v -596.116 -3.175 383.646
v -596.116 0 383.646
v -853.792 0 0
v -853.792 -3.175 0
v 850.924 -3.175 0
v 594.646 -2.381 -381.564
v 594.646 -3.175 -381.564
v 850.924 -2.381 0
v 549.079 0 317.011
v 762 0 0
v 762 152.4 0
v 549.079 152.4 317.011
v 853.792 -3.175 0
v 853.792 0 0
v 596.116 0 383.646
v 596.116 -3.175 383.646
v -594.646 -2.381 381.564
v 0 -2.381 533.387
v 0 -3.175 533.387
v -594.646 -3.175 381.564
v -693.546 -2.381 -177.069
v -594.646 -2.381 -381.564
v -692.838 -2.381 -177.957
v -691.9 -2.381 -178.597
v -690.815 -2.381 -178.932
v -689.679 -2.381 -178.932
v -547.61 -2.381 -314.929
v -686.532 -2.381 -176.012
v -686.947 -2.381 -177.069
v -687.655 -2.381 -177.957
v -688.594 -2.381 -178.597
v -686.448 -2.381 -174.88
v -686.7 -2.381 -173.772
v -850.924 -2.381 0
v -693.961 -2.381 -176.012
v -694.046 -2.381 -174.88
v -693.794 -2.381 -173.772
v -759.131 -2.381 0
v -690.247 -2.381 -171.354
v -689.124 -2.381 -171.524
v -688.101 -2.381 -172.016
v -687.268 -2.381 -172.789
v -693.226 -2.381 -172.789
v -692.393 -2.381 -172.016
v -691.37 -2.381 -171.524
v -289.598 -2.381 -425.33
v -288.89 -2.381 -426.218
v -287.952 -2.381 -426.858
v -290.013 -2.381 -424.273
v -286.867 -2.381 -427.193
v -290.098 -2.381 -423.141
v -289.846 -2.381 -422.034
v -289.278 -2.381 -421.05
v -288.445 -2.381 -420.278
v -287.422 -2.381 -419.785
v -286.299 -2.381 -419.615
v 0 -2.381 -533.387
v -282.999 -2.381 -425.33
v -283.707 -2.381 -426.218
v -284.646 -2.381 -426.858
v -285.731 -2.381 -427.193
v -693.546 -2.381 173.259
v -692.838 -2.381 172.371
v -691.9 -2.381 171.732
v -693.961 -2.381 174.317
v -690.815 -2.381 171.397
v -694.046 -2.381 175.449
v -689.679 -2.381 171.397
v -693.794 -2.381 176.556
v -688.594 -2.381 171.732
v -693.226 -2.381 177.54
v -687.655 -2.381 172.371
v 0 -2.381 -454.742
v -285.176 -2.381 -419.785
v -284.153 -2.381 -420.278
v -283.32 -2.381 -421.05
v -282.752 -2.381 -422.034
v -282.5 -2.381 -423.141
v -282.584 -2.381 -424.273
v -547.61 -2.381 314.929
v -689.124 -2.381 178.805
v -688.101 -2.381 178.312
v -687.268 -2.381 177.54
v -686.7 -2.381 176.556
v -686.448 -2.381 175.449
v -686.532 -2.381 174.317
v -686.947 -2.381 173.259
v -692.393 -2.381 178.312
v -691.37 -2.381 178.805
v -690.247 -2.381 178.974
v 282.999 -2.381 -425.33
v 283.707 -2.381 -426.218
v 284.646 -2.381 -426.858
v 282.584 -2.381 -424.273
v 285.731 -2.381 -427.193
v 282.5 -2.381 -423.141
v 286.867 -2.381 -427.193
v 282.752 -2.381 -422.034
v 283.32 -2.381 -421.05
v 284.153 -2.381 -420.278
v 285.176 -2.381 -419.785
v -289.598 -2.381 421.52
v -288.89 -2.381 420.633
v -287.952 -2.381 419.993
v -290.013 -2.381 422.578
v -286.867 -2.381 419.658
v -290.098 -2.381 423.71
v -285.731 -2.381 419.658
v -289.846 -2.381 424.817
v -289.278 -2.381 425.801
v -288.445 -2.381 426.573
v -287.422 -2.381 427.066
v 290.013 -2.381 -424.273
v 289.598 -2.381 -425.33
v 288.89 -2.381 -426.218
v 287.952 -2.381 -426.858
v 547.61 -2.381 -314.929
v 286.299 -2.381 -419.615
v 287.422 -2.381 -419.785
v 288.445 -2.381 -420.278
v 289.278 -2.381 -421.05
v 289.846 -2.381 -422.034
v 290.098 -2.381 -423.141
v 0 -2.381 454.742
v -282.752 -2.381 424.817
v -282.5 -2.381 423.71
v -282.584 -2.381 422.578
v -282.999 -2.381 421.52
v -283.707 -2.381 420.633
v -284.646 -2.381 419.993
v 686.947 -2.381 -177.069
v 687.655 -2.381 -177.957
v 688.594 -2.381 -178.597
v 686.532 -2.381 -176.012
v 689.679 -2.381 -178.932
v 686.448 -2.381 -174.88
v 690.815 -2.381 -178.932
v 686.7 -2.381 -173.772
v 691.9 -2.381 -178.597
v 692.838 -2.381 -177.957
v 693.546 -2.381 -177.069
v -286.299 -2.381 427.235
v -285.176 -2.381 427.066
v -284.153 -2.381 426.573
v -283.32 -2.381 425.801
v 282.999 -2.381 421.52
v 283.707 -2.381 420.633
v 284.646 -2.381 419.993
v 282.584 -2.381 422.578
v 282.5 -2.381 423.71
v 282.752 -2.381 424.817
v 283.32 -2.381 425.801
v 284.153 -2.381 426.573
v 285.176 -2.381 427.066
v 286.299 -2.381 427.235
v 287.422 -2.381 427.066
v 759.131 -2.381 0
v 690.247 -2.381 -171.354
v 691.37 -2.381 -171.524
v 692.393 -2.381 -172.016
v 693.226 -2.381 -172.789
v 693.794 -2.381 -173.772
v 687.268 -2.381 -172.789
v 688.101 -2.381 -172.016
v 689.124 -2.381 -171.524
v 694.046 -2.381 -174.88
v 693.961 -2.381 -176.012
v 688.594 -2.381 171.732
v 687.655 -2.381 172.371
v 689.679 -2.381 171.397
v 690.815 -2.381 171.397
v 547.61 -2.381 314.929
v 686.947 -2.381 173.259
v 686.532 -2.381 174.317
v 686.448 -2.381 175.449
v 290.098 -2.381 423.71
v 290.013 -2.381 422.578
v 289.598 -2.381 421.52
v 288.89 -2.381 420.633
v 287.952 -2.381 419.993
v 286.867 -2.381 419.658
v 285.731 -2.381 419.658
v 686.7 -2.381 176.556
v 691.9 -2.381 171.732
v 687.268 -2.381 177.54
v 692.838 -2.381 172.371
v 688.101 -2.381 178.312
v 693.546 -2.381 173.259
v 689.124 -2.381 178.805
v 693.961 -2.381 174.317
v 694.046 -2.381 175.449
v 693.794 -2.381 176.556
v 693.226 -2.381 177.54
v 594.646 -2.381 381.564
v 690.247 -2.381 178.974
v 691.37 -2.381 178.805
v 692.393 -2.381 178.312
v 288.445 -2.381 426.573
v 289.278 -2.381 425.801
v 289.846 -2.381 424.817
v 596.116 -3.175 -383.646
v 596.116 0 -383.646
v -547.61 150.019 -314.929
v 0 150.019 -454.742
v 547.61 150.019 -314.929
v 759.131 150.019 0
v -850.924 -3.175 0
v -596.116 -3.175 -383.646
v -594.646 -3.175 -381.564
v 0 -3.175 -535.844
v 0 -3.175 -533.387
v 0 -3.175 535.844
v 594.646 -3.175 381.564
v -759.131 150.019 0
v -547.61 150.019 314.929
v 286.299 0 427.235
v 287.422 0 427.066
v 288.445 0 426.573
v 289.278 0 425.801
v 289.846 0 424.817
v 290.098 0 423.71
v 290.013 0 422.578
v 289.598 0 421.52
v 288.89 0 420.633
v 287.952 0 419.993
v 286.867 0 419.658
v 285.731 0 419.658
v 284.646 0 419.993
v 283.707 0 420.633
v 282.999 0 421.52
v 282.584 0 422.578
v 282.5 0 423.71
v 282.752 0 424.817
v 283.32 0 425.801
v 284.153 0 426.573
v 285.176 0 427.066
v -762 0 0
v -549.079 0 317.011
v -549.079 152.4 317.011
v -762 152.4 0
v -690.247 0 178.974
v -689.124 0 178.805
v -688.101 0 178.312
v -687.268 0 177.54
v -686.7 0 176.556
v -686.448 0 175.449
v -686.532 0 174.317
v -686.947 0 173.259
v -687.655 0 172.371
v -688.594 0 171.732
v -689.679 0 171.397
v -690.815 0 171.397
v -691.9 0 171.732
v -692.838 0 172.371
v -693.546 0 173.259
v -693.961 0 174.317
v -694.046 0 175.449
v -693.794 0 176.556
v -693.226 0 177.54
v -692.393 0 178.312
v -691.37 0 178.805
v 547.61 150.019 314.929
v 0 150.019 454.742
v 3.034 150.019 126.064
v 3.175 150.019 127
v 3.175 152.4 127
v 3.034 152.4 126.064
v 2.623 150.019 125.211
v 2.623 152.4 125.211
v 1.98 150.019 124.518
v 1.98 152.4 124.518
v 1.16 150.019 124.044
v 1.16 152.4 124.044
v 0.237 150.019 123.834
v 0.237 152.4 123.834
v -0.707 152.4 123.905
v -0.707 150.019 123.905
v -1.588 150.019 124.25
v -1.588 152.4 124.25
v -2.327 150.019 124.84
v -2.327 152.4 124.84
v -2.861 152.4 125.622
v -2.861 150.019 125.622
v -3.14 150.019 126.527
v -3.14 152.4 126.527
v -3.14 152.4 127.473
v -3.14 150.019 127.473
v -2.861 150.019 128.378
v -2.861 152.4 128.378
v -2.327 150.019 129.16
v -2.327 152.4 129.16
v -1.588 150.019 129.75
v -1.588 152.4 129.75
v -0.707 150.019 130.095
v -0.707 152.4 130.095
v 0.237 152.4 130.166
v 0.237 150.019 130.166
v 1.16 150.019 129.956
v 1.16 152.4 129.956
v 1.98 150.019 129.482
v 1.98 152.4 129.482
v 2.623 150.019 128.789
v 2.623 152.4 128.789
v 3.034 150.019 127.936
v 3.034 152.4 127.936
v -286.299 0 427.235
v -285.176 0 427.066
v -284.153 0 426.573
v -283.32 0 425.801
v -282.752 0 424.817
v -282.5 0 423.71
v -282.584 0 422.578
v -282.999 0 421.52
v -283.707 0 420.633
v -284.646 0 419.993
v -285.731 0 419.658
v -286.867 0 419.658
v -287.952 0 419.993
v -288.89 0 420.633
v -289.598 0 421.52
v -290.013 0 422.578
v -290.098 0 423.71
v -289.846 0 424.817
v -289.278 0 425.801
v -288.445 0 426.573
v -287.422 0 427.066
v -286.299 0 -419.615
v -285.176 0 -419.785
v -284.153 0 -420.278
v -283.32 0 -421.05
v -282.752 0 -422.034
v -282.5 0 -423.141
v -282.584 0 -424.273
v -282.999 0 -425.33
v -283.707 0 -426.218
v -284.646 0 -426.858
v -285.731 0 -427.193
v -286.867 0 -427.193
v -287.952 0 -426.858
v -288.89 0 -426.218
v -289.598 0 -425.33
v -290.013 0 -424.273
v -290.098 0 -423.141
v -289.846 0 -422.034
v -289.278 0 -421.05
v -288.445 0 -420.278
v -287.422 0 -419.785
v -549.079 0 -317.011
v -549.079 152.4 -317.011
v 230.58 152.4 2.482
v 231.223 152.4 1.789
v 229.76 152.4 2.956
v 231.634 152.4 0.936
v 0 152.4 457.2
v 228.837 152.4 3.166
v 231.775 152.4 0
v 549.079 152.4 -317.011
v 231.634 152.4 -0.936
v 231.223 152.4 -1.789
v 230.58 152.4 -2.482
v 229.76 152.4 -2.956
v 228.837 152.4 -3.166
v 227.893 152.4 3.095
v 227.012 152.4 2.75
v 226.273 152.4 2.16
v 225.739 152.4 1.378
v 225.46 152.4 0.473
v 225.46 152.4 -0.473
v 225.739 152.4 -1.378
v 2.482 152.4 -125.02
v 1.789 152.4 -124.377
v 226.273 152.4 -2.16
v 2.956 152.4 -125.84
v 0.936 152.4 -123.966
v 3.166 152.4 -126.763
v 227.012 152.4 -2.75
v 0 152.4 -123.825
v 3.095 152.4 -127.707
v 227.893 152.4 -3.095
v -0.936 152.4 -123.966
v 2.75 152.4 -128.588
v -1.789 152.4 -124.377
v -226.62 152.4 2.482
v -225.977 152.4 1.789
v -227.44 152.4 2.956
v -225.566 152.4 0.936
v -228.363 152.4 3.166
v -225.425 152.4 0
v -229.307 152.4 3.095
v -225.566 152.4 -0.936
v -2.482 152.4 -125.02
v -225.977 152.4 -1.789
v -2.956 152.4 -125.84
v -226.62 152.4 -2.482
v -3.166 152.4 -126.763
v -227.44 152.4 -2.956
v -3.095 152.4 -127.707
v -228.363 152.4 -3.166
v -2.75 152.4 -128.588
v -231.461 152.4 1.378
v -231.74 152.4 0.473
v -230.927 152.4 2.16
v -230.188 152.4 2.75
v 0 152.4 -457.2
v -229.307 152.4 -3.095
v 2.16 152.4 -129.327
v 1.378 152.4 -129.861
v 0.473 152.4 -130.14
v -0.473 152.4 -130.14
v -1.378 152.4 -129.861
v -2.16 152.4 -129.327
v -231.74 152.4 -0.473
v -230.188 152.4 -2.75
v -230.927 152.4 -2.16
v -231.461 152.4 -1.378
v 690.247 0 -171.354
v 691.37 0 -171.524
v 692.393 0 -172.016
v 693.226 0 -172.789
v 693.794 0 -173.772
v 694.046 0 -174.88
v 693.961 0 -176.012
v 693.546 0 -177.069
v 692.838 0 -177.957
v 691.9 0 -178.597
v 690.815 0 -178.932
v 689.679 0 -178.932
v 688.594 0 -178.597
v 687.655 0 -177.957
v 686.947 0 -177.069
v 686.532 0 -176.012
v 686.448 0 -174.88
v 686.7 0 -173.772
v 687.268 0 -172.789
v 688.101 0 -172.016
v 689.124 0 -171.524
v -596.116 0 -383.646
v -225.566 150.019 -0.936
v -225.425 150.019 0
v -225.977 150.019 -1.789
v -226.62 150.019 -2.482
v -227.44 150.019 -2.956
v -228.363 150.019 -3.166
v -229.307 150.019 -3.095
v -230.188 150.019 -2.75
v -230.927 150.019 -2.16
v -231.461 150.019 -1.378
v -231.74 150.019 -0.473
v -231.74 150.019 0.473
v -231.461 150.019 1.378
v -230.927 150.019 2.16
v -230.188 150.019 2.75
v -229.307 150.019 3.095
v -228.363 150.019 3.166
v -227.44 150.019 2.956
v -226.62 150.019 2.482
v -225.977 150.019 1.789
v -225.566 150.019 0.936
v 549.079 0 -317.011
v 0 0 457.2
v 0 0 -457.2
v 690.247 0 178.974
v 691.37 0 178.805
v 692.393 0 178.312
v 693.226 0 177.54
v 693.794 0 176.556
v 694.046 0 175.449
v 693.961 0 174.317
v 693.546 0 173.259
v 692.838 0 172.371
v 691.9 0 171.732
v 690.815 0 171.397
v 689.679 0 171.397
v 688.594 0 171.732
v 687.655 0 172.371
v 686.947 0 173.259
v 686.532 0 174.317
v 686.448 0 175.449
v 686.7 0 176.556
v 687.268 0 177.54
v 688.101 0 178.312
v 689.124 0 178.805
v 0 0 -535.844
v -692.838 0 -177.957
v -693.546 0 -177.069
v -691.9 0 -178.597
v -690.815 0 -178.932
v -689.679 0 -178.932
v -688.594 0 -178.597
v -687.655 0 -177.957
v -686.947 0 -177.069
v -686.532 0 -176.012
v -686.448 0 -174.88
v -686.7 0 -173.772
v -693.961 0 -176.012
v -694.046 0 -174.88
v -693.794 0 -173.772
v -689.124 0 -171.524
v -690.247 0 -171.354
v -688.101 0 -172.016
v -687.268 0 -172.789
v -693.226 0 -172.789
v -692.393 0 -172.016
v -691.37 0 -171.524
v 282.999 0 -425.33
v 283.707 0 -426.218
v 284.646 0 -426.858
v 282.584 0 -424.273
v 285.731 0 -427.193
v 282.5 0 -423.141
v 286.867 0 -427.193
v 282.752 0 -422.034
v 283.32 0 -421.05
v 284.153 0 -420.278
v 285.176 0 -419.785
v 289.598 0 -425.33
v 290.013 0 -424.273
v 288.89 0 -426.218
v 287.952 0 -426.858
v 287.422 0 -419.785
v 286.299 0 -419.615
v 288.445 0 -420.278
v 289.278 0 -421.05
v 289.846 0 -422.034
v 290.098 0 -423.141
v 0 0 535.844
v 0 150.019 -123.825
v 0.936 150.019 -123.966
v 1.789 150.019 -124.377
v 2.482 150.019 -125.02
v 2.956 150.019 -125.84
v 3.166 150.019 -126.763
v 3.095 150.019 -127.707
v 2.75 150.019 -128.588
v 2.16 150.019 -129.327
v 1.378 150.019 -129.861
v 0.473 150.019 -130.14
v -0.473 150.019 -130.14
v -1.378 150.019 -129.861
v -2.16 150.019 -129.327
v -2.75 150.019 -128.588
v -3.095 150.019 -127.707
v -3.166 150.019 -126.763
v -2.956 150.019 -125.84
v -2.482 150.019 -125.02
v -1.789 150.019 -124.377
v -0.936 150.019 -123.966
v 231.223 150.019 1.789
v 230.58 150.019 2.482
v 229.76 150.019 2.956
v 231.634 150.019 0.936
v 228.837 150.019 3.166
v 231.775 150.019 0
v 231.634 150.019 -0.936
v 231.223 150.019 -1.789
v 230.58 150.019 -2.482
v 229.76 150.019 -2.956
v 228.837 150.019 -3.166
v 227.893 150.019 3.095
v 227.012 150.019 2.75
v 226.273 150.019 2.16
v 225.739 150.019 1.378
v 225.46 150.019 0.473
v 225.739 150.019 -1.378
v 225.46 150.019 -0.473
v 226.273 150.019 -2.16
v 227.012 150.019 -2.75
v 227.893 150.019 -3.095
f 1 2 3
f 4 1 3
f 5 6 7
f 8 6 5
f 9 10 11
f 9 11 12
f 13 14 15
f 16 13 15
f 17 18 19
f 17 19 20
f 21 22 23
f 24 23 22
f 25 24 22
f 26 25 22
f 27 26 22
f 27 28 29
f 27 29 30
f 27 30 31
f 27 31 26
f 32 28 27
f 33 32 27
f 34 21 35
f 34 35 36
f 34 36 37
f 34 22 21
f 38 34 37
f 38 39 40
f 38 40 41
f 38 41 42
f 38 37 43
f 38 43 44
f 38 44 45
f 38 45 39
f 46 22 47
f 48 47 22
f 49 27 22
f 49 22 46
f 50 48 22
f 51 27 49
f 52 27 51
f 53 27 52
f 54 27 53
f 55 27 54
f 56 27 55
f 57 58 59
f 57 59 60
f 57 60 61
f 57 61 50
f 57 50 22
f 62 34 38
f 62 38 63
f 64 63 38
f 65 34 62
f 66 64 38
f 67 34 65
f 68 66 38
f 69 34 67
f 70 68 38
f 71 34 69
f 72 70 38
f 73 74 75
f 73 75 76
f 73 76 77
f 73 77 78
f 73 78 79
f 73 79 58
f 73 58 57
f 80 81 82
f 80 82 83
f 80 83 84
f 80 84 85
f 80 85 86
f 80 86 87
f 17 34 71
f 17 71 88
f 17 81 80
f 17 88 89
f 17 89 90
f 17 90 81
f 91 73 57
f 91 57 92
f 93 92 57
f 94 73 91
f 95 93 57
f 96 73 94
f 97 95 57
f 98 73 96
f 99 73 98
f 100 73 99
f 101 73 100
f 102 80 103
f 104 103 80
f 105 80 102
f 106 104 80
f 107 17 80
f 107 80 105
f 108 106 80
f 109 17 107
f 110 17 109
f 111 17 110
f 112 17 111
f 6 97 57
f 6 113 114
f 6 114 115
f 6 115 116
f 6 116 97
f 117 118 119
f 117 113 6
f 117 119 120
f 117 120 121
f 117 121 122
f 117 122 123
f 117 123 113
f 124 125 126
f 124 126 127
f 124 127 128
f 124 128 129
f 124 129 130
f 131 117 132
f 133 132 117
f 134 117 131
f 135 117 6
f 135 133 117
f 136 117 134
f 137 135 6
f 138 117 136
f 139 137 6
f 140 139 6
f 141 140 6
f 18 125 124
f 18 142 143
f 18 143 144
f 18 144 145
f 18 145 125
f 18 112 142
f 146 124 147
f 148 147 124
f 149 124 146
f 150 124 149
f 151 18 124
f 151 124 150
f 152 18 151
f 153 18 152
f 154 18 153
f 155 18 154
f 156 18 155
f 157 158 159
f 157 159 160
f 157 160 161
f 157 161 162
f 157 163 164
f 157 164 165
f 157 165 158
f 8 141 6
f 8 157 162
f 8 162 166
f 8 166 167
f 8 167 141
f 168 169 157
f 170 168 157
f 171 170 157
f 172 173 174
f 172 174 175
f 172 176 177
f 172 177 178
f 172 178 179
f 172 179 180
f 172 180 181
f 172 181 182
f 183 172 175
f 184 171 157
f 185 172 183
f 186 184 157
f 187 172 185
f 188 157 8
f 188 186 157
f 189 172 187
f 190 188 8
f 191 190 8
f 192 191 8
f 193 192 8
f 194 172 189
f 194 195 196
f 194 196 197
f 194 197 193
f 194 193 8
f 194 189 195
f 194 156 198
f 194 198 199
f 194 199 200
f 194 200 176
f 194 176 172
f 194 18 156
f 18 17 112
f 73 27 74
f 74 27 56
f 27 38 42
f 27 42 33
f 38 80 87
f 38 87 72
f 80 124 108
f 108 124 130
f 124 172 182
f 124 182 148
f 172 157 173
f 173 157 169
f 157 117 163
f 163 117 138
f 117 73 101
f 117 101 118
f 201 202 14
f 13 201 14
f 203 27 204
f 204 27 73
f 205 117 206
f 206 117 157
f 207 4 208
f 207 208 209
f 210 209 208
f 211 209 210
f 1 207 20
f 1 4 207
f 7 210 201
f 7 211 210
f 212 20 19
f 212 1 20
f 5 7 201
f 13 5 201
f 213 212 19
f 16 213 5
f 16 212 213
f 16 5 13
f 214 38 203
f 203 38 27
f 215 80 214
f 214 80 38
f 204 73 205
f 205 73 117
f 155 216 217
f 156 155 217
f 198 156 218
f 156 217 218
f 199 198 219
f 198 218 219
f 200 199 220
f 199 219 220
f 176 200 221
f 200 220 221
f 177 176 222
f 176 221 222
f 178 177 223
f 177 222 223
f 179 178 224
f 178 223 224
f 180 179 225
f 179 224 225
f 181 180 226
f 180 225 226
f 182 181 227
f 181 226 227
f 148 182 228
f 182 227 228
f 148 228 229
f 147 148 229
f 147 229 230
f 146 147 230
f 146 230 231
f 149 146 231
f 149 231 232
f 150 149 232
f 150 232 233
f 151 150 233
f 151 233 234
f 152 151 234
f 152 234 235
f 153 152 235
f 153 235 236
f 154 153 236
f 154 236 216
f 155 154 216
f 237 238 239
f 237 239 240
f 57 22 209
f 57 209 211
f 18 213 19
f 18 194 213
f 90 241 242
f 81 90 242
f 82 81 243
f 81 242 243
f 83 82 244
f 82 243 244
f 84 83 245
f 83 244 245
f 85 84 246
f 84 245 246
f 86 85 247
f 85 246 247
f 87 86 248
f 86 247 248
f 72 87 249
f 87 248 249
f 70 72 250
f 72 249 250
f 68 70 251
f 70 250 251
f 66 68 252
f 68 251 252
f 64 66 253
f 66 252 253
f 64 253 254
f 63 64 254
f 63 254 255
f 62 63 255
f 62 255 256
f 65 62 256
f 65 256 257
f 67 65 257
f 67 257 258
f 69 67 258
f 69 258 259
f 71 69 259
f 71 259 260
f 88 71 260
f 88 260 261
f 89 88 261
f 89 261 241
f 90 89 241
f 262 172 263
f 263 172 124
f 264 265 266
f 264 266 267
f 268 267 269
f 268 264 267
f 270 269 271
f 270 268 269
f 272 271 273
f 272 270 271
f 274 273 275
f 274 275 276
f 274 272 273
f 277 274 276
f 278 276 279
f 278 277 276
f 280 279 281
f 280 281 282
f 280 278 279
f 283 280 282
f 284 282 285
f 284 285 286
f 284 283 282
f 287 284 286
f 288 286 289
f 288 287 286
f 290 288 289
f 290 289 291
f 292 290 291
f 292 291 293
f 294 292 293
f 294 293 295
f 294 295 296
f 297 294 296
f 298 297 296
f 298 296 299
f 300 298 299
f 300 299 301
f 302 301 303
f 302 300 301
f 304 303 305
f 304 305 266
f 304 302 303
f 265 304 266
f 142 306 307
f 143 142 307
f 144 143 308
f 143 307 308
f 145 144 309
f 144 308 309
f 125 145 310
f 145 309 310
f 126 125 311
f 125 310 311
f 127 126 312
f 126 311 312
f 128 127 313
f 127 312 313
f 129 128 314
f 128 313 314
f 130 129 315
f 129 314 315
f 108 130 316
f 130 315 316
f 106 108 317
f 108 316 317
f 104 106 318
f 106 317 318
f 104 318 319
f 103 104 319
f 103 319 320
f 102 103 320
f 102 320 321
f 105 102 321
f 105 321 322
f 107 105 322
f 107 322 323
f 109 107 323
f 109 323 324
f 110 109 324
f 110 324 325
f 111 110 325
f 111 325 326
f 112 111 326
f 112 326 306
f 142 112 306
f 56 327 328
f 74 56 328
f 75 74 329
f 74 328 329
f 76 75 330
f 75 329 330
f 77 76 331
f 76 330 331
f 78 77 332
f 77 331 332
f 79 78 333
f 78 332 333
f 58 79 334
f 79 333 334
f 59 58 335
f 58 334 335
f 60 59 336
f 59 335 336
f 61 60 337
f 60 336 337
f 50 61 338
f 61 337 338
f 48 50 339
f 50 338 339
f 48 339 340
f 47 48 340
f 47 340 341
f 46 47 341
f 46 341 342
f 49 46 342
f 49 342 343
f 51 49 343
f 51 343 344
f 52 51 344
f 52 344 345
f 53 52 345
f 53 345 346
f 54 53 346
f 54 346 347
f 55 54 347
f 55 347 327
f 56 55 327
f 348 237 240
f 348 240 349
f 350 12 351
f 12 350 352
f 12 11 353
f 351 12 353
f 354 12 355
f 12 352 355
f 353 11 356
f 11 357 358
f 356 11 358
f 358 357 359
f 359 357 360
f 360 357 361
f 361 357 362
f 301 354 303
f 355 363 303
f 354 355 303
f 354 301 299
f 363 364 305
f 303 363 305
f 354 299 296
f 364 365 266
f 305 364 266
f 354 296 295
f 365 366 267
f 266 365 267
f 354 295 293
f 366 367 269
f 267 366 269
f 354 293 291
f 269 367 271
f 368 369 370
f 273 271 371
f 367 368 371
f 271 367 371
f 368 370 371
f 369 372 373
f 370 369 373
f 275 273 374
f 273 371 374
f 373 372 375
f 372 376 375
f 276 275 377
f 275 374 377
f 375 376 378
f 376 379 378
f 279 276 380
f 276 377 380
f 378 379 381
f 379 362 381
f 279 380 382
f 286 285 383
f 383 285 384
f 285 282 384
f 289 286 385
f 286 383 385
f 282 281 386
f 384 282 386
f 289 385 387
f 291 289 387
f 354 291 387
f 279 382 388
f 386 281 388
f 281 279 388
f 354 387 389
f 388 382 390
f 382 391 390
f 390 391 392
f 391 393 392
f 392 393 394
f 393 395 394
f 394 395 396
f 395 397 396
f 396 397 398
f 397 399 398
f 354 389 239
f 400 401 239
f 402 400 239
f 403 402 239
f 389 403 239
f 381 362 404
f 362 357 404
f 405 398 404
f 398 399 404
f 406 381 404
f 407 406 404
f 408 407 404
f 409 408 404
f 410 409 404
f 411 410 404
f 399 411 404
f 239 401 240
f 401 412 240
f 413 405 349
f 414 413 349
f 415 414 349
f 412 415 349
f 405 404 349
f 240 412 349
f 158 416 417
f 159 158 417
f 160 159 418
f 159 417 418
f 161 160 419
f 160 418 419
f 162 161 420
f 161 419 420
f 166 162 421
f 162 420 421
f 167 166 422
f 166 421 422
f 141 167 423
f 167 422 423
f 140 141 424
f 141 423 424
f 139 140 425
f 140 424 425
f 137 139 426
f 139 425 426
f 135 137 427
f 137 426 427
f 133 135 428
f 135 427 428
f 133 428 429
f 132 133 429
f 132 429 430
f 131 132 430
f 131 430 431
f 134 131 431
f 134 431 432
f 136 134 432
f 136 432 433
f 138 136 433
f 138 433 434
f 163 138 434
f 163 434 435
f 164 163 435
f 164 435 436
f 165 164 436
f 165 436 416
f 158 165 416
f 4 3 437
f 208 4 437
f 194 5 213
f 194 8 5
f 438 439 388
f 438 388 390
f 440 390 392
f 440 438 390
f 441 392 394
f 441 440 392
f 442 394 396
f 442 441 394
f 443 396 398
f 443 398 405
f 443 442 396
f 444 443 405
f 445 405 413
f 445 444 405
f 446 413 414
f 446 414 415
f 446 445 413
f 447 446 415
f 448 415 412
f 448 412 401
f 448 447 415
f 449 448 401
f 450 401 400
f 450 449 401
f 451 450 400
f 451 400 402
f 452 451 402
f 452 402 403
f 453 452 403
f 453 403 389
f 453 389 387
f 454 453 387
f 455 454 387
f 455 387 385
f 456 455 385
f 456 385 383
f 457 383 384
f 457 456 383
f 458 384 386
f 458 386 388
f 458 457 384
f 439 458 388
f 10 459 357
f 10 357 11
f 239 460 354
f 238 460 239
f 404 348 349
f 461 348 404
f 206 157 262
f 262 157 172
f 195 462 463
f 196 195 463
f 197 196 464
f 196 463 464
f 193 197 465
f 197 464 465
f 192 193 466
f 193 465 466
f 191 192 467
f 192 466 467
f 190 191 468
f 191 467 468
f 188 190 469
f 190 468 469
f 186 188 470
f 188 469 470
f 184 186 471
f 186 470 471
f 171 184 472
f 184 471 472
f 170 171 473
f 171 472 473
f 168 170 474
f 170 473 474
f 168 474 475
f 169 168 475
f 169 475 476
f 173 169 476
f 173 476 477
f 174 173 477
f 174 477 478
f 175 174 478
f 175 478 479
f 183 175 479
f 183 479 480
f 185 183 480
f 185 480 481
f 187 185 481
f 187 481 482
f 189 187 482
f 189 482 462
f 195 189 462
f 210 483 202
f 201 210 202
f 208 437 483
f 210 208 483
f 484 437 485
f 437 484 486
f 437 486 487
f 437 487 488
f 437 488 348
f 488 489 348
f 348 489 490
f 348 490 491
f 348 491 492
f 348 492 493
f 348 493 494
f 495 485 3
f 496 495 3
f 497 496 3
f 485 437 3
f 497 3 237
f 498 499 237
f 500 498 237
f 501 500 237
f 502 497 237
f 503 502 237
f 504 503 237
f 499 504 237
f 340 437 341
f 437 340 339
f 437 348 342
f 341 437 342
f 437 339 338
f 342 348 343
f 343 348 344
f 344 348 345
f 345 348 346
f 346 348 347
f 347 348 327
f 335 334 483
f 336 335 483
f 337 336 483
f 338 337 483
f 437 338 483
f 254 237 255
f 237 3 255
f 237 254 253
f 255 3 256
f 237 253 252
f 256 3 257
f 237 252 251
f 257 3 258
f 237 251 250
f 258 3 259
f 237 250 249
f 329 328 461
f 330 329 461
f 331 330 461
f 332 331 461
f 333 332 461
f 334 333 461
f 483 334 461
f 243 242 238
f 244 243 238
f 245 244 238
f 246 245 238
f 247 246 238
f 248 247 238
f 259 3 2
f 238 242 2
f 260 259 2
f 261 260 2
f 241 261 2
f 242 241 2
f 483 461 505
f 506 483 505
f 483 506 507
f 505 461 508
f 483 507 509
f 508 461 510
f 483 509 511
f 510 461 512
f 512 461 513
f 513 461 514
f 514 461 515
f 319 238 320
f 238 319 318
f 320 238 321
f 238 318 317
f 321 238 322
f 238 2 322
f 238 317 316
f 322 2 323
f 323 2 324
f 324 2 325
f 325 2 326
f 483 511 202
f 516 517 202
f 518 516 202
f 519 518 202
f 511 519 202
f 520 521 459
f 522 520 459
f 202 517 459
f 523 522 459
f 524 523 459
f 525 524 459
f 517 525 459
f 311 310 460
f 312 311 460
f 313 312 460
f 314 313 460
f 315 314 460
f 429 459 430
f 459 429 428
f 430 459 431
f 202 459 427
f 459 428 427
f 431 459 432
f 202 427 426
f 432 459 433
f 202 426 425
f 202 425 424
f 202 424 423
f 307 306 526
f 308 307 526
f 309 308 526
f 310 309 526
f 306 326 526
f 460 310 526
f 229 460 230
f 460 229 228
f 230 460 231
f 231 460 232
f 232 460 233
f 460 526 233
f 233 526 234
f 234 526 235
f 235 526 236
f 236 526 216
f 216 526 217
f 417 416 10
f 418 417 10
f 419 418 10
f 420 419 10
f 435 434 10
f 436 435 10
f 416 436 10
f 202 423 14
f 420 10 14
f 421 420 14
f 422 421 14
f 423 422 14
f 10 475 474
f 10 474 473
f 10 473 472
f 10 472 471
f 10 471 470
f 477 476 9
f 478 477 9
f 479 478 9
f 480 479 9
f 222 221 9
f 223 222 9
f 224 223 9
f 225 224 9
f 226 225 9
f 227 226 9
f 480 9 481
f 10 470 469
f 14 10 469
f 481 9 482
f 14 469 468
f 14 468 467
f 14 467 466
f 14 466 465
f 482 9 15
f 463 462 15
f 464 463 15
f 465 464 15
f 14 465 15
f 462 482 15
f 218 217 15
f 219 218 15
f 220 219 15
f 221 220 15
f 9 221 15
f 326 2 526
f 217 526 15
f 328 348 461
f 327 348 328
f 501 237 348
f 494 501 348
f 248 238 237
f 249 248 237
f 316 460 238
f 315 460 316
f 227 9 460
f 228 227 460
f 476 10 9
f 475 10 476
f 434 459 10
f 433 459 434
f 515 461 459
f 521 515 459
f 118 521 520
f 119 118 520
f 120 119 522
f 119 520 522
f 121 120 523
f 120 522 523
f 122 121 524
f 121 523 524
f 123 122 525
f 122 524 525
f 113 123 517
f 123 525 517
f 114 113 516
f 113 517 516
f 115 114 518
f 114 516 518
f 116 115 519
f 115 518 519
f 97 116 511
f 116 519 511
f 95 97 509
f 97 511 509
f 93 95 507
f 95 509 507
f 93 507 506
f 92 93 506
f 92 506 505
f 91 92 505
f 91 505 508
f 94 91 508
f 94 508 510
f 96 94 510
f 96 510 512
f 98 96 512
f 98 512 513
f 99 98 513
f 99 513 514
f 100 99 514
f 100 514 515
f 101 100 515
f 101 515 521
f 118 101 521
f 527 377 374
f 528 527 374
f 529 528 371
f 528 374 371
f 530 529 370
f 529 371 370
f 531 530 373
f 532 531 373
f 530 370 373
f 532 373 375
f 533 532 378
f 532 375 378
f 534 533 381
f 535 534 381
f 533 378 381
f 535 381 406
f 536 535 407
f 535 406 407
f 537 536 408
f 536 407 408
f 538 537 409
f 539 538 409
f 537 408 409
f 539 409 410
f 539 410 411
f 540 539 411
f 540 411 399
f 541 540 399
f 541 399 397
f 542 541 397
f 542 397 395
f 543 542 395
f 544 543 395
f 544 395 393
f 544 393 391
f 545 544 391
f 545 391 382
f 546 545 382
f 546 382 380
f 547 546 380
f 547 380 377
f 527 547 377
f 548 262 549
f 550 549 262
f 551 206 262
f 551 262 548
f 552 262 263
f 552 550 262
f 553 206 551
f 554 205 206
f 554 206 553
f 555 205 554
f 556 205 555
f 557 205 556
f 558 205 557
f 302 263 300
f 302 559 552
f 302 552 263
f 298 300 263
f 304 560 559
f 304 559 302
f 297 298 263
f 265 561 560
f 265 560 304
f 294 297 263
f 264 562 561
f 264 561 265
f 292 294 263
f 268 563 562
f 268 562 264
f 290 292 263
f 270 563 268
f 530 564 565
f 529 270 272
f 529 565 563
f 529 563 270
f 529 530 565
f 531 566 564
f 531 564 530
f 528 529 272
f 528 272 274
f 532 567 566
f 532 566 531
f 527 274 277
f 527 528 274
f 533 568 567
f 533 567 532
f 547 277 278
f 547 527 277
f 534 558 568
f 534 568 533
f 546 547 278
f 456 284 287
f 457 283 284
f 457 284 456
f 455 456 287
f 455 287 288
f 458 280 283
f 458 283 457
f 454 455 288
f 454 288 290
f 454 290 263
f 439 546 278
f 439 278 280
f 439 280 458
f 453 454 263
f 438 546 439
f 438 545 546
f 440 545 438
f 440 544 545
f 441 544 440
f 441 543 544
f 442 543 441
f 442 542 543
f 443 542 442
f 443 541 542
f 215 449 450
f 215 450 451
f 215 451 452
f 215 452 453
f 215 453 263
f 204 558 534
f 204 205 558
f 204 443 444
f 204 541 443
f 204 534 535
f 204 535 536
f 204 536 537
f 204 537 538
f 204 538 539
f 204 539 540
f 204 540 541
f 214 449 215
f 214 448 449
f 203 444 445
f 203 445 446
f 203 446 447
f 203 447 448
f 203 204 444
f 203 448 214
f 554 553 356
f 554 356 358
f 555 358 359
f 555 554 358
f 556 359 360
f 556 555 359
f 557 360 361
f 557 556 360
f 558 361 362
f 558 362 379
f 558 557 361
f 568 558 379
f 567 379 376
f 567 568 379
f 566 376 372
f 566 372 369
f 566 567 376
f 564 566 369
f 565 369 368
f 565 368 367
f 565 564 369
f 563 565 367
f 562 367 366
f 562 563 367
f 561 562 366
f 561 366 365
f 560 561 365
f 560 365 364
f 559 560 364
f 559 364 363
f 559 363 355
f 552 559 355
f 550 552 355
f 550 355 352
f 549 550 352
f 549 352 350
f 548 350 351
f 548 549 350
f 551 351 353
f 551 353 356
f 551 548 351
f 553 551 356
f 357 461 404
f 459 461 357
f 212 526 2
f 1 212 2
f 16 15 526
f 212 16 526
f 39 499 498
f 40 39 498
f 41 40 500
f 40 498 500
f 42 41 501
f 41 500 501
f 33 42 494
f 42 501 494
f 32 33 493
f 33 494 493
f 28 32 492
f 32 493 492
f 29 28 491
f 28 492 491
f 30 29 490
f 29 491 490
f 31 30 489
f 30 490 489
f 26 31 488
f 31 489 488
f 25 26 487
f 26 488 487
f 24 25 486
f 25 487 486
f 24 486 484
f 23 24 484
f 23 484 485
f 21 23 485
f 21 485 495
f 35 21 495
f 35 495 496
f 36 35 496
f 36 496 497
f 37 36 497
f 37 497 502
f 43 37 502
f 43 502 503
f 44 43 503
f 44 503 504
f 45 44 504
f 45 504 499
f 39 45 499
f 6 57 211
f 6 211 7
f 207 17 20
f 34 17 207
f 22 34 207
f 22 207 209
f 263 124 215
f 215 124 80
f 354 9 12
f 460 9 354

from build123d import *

# Parameters (mm, degrees)
BOSS_EXTRUDE1_DEPTH   = 152.4
BOSS_EXTRUDE2_DEPTH   = 3.175
SHELL1_T              = -2.38125
SKETCH3_R             = 3.175
CUT_EXTRUDE1_DEPTH    = 1020.94798284
CRVPATTERN1_START     = 150.01875
CRVPATTERN1_OUTLINE_R = 3.175
CRVPATTERN1_DEPTH     = 2.38125
CUT_EXTRUDE2_REACH    = 1021.469
SKETCH5_R             = 3.81


# Read off the part's stored shape, not the designer's step: CrvPattern1
with BuildPart() as part:
    # Sketch1 → Boss-Extrude1 (new body)
    with BuildSketch(Plane(origin=(0, 0, 0), x_dir=(1, 0, 0), z_dir=(0, 1, 0))):
        Polygon((-549.079439398, 317.011162143), (0, 457.2), (549.079439398, 317.011162143), (762, 0), (549.079439398, -317.011162143), (0, -457.2), (-549.079439398, -317.011162143), (-762, 0), align=None)
    extrude(amount=BOSS_EXTRUDE1_DEPTH)

    # Sketch2 → Boss-Extrude2 (add)
    with BuildSketch(Plane.XZ):
        Polygon((0, 535.844392641), (-596.116107134, 383.646334781), (-853.792184287, 0), (-596.116107134, -383.646334781), (0, -535.844392641), (596.116107134, -383.646334781), (853.792184287, 0), (596.116107134, 383.646334781), align=None)
    extrude(amount=BOSS_EXTRUDE2_DEPTH)

    # Shell1
    shell1_openings = [part.faces().sort_by_distance(p)[0] for p in [
        (0, -3.175, 0),
    ]]
    offset(amount=SHELL1_T, openings=shell1_openings, kind=Kind.INTERSECTION)

    # Sketch3 → Cut-Extrude1 (cut, through all)
    with BuildSketch(Plane(origin=(0, 152.4, 0), x_dir=(1, 0, 0), z_dir=(0, 1, 0))):
        with Locations(Location((0, 127, 0), (0, 0, 270))):
            Circle(SKETCH3_R)
    extrude(amount=-CUT_EXTRUDE1_DEPTH, mode=Mode.SUBTRACT)

    # CrvPattern1 outline → CrvPattern1 (cut)
    with BuildSketch(Plane(origin=(0, 0, 0), x_dir=(1, 0, 0), z_dir=(0, 1, 0)).offset(CRVPATTERN1_START)):
        with Locations((-228.6, 0)):
            Circle(CRVPATTERN1_OUTLINE_R)
        with Locations((0, -127)):
            Circle(CRVPATTERN1_OUTLINE_R)
        with Locations((228.6, 0)):
            Circle(CRVPATTERN1_OUTLINE_R)
    extrude(amount=CRVPATTERN1_DEPTH, mode=Mode.SUBTRACT)

    # Sketch5 → Cut-Extrude2 (cut, up to next)
    with BuildSketch(Plane(origin=(0, 0, 0), x_dir=(1, 0, 0), z_dir=(0, 1, 0)), mode=Mode.PRIVATE) as cut_extrude2_sk1:
        with Locations(Location((-286.298886633, 423.425472391, 0), (0, 0, 270))):
            Circle(SKETCH5_R)
    cut_extrude2_tool1 = extrude(cut_extrude2_sk1.sketch, amount=-CUT_EXTRUDE2_REACH, mode=Mode.PRIVATE) & part.part
    # Sketch5 → Cut-Extrude2 (cut, up to next)
    with BuildSketch(Plane(origin=(0, 0, 0), x_dir=(1, 0, 0), z_dir=(0, 1, 0)), mode=Mode.PRIVATE) as cut_extrude2_sk2:
        with Locations(Location((-690.246932705, 175.164374231, 0), (0, 0, 270))):
            Circle(SKETCH5_R)
    cut_extrude2_tool2 = extrude(cut_extrude2_sk2.sketch, amount=-CUT_EXTRUDE2_REACH, mode=Mode.PRIVATE) & part.part
    # Sketch5 → Cut-Extrude2 (cut, up to next)
    with BuildSketch(Plane(origin=(0, 0, 0), x_dir=(1, 0, 0), z_dir=(0, 1, 0)), mode=Mode.PRIVATE) as cut_extrude2_sk3:
        with Locations(Location((-690.246932705, -175.164374231, 0), (0, 0, 270))):
            Circle(SKETCH5_R)
    cut_extrude2_tool3 = extrude(cut_extrude2_sk3.sketch, amount=-CUT_EXTRUDE2_REACH, mode=Mode.PRIVATE) & part.part
    # Sketch5 → Cut-Extrude2 (cut, up to next)
    with BuildSketch(Plane(origin=(0, 0, 0), x_dir=(1, 0, 0), z_dir=(0, 1, 0)), mode=Mode.PRIVATE) as cut_extrude2_sk4:
        with Locations(Location((-286.298886633, -423.425472391, 0), (0, 0, 270))):
            Circle(SKETCH5_R)
    cut_extrude2_tool4 = extrude(cut_extrude2_sk4.sketch, amount=-CUT_EXTRUDE2_REACH, mode=Mode.PRIVATE) & part.part
    # Sketch5 → Cut-Extrude2 (cut, up to next)
    with BuildSketch(Plane(origin=(0, 0, 0), x_dir=(1, 0, 0), z_dir=(0, 1, 0)), mode=Mode.PRIVATE) as cut_extrude2_sk5:
        with Locations(Location((286.298886633, -423.425472391, 0), (0, 0, 270))):
            Circle(SKETCH5_R)
    cut_extrude2_tool5 = extrude(cut_extrude2_sk5.sketch, amount=-CUT_EXTRUDE2_REACH, mode=Mode.PRIVATE) & part.part
    # Sketch5 → Cut-Extrude2 (cut, up to next)
    with BuildSketch(Plane(origin=(0, 0, 0), x_dir=(1, 0, 0), z_dir=(0, 1, 0)), mode=Mode.PRIVATE) as cut_extrude2_sk6:
        with Locations(Location((690.246932705, -175.164374231, 0), (0, 0, 270))):
            Circle(SKETCH5_R)
    cut_extrude2_tool6 = extrude(cut_extrude2_sk6.sketch, amount=-CUT_EXTRUDE2_REACH, mode=Mode.PRIVATE) & part.part
    # Sketch5 → Cut-Extrude2 (cut, up to next)
    with BuildSketch(Plane(origin=(0, 0, 0), x_dir=(1, 0, 0), z_dir=(0, 1, 0)), mode=Mode.PRIVATE) as cut_extrude2_sk7:
        with Locations(Location((690.246932705, 175.164374231, 0), (0, 0, 270))):
            Circle(SKETCH5_R)
    cut_extrude2_tool7 = extrude(cut_extrude2_sk7.sketch, amount=-CUT_EXTRUDE2_REACH, mode=Mode.PRIVATE) & part.part
    # Sketch5 → Cut-Extrude2 (cut, up to next)
    with BuildSketch(Plane(origin=(0, 0, 0), x_dir=(1, 0, 0), z_dir=(0, 1, 0)), mode=Mode.PRIVATE) as cut_extrude2_sk8:
        with Locations(Location((286.298886633, 423.425472391, 0), (0, 0, 270))):
            Circle(SKETCH5_R)
    cut_extrude2_tool8 = extrude(cut_extrude2_sk8.sketch, amount=-CUT_EXTRUDE2_REACH, mode=Mode.PRIVATE) & part.part
    add(cut_extrude2_tool1.solids().sort_by_distance((-286.298887, 0, -423.425472))[0], mode=Mode.SUBTRACT)
    add(cut_extrude2_tool2.solids().sort_by_distance((-690.246933, 0, -175.164374))[0], mode=Mode.SUBTRACT)
    add(cut_extrude2_tool3.solids().sort_by_distance((-690.246933, 0, 175.164374))[0], mode=Mode.SUBTRACT)
    add(cut_extrude2_tool4.solids().sort_by_distance((-286.298887, 0, 423.425472))[0], mode=Mode.SUBTRACT)
    add(cut_extrude2_tool5.solids().sort_by_distance((286.298887, 0, 423.425472))[0], mode=Mode.SUBTRACT)
    add(cut_extrude2_tool6.solids().sort_by_distance((690.246933, 0, 175.164374))[0], mode=Mode.SUBTRACT)
    add(cut_extrude2_tool7.solids().sort_by_distance((690.246933, 0, -175.164374))[0], mode=Mode.SUBTRACT)
    add(cut_extrude2_tool8.solids().sort_by_distance((286.298887, 0, -423.425472))[0], mode=Mode.SUBTRACT)


solid = part.part
